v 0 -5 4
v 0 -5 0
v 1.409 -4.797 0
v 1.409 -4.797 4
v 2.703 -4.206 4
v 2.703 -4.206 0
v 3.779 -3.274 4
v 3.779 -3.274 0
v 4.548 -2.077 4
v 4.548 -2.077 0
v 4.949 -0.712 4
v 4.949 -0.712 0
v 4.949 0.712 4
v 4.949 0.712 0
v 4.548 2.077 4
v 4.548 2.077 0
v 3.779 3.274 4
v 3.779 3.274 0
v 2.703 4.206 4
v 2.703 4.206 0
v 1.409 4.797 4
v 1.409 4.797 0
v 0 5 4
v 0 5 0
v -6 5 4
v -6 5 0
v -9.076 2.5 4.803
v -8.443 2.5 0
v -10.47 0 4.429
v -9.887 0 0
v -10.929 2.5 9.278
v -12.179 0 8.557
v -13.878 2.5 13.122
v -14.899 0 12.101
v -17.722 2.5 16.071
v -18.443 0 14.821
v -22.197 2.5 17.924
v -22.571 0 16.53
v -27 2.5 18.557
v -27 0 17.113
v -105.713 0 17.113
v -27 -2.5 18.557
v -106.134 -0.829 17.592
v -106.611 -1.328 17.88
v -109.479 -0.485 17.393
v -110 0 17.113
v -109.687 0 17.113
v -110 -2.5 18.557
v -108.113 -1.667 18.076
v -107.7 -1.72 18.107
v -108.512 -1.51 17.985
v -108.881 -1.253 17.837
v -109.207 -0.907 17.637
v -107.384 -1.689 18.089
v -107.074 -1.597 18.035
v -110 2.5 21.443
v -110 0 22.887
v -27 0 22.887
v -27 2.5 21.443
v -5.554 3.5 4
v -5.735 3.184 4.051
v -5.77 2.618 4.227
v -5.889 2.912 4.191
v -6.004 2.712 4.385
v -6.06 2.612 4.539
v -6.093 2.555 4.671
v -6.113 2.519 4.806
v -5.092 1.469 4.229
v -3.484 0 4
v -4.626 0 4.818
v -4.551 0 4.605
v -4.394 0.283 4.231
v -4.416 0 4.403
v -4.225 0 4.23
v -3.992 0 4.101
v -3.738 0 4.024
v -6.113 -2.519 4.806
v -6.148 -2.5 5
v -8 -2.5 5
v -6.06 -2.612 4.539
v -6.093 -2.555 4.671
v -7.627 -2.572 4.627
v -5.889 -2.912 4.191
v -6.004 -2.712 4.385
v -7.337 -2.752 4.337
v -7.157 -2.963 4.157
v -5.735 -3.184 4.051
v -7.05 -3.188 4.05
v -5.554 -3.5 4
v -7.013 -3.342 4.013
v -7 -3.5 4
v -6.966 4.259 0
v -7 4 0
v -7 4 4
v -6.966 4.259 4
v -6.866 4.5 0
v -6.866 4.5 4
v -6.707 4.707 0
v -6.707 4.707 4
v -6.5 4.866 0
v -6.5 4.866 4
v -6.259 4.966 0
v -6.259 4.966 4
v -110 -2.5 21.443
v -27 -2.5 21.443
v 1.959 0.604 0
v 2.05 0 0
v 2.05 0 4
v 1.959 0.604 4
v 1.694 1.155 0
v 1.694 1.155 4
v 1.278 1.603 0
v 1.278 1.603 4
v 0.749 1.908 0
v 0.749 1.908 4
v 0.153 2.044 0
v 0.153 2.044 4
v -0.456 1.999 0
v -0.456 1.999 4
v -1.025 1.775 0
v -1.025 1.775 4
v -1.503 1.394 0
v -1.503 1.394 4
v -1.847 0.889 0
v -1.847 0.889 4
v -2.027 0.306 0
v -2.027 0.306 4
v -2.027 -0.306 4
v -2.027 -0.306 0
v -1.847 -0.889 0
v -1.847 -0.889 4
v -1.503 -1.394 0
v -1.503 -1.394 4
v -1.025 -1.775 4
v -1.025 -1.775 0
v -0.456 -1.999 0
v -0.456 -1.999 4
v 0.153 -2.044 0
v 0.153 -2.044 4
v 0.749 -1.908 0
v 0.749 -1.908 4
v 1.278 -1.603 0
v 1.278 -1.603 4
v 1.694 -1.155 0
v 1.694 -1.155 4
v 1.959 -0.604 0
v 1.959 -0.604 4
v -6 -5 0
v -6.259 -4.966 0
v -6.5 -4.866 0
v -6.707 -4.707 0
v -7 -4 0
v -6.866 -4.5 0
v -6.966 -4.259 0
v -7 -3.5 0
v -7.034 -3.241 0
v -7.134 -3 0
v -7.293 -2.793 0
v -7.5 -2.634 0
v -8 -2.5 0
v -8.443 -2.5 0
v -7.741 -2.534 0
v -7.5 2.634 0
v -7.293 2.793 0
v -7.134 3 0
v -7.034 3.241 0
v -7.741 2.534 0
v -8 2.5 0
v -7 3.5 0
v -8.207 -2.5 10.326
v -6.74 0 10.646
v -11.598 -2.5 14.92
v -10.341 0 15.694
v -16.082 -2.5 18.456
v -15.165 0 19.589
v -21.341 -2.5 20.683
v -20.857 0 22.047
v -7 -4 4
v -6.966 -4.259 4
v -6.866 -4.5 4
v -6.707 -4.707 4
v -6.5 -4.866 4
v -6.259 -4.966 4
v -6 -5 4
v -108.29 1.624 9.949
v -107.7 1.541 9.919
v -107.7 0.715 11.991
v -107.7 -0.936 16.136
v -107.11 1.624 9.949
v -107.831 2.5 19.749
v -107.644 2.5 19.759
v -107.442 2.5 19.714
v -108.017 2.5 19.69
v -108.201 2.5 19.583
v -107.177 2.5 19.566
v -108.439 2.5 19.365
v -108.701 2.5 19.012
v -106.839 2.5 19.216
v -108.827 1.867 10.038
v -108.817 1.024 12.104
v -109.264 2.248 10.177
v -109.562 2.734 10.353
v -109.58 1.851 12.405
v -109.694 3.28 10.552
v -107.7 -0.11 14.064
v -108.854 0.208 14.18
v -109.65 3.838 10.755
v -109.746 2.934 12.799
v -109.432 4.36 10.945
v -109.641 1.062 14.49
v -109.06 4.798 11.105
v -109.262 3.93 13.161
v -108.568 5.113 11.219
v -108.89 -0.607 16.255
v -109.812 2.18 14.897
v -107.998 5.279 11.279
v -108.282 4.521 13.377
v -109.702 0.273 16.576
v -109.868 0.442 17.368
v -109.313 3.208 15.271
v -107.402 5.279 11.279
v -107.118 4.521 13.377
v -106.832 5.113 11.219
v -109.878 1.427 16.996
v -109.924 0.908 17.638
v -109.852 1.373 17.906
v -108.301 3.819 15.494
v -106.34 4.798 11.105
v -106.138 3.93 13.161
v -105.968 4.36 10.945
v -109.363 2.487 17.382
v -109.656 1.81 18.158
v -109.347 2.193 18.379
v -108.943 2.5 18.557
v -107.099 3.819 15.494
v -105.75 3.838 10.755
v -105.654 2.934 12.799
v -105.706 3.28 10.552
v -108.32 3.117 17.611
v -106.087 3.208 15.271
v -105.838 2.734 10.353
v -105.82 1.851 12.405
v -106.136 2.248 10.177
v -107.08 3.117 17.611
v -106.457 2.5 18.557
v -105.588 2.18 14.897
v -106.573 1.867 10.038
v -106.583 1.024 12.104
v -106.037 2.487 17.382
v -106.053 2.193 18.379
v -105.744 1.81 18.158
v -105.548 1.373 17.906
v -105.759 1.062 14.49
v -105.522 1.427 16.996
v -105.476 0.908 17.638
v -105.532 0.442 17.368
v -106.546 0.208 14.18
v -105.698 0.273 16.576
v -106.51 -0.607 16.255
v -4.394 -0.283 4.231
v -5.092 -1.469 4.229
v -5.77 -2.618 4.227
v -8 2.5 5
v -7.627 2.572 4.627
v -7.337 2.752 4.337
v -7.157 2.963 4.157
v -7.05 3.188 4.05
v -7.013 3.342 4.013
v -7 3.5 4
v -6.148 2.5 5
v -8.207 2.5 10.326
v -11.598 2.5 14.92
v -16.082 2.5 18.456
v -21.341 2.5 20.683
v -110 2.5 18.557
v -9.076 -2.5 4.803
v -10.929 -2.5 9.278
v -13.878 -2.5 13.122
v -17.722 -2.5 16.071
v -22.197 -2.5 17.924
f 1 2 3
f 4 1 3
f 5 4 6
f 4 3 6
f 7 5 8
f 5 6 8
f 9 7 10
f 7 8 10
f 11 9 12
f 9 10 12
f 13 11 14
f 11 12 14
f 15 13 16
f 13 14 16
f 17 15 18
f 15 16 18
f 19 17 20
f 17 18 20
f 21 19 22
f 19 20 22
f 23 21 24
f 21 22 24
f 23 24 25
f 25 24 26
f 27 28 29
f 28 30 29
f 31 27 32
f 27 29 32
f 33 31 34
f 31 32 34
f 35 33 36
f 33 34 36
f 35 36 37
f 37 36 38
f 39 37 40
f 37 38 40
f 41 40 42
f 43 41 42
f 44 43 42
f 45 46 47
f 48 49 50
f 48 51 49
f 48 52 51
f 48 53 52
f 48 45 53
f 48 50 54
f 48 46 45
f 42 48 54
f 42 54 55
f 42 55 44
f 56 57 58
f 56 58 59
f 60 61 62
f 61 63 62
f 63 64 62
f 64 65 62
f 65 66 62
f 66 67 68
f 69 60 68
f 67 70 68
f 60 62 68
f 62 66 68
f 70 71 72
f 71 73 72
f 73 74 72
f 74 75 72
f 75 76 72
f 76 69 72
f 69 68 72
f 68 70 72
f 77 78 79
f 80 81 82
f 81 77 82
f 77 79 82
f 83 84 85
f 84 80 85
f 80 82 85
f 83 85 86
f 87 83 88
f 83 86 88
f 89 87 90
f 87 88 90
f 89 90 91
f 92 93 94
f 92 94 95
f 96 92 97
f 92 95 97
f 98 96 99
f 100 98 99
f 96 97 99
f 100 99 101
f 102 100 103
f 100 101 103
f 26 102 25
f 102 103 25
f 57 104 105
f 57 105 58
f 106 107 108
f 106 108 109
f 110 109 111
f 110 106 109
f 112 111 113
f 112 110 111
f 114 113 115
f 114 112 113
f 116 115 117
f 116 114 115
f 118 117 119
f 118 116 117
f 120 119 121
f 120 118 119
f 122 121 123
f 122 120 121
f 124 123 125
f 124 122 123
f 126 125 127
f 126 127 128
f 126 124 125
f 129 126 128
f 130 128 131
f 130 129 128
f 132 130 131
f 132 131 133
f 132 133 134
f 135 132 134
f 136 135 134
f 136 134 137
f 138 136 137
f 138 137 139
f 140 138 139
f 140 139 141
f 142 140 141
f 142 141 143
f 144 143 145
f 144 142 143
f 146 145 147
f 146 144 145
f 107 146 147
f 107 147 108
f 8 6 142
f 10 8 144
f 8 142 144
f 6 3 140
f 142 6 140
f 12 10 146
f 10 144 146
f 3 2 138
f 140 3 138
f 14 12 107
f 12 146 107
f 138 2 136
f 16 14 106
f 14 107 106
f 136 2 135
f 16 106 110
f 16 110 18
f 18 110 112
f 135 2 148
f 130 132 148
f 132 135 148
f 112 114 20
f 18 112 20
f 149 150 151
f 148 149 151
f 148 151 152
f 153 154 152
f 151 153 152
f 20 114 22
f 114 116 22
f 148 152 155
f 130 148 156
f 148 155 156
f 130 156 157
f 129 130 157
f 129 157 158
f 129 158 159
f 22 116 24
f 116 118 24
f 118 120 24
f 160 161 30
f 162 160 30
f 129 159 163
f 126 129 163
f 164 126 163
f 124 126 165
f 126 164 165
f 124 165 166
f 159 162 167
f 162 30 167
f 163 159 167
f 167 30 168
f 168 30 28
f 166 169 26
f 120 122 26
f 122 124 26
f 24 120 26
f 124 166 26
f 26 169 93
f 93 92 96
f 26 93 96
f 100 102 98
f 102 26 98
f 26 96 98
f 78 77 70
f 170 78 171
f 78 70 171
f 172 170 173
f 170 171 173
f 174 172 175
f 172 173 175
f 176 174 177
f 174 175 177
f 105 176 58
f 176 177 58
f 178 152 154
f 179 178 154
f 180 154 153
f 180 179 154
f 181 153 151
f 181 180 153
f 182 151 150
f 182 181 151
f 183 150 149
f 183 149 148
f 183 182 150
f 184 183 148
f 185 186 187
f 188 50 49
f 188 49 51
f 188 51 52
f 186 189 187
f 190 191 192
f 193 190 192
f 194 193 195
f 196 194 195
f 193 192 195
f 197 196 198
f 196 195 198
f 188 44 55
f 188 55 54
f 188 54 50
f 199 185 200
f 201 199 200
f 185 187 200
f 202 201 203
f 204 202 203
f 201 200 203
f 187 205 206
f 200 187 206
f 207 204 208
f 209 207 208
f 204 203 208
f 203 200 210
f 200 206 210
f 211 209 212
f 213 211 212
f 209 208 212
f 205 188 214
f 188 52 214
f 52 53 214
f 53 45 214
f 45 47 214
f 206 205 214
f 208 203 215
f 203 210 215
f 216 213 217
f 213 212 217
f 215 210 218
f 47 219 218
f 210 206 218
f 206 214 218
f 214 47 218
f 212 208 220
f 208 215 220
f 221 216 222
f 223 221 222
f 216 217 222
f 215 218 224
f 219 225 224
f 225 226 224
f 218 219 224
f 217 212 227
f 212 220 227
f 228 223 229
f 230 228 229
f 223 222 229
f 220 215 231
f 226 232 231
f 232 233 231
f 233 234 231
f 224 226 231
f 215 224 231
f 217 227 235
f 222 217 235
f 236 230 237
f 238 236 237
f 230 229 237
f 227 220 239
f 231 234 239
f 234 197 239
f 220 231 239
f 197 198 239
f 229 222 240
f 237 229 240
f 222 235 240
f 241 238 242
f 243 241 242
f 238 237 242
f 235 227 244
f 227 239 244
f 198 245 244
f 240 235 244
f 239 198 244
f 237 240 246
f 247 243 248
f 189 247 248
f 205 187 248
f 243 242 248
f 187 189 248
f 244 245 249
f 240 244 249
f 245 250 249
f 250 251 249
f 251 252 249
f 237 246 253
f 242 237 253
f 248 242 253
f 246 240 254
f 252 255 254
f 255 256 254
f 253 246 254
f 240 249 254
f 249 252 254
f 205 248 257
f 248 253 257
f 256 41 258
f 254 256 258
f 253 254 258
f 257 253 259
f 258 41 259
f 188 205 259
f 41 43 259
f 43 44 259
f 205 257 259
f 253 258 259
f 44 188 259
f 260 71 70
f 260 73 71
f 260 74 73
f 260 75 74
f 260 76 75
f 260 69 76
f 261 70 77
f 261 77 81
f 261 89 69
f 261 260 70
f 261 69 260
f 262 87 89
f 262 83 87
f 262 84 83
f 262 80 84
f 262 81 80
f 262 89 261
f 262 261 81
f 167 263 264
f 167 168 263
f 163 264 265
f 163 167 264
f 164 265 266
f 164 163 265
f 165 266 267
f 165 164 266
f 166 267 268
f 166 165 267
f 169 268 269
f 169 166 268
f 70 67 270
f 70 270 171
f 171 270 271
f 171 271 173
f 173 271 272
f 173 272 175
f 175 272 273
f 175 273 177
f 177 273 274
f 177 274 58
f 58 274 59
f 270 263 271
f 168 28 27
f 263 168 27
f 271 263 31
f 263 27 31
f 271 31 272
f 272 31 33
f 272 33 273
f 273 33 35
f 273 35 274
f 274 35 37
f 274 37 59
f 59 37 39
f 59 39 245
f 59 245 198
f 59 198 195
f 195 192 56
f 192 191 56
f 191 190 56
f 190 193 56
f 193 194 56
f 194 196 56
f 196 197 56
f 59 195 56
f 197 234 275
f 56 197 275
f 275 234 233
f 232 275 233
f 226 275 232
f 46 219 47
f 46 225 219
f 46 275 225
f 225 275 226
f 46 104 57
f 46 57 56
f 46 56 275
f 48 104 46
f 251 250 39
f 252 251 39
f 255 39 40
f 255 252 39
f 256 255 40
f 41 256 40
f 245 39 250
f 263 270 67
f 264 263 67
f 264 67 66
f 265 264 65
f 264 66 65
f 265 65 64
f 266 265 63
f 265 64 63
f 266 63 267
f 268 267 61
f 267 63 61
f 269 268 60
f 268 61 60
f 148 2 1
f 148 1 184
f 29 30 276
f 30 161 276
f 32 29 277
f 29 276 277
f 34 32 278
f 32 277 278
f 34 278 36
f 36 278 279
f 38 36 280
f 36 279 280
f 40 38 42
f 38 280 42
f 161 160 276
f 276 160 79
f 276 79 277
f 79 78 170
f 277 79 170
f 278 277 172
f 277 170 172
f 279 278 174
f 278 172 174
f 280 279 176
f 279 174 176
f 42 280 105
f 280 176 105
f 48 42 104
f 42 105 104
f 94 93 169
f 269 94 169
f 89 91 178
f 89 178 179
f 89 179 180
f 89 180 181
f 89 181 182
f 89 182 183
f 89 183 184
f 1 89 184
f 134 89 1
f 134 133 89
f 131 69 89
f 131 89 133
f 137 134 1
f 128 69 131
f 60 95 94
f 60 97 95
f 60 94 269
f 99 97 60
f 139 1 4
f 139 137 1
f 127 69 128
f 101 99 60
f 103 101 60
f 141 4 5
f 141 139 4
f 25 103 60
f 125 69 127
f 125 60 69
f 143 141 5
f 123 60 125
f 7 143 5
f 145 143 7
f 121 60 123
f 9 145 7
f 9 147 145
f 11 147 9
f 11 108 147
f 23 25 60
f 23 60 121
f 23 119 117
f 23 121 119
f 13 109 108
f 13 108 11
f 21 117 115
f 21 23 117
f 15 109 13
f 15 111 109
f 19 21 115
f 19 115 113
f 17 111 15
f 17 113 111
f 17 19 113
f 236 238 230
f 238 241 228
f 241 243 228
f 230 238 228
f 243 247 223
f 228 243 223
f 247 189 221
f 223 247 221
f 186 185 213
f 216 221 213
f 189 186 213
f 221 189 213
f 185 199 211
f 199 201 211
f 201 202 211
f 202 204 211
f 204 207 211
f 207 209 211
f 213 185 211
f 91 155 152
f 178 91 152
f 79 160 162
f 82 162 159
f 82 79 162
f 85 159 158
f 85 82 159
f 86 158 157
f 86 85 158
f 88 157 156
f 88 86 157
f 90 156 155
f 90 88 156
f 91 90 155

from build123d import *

# Parameters (mm, degrees)
SKETCH_R  = 2.05
PAD_DEPTH = 4
FILLET_R  = 1


with BuildPart() as part:
    # Sketch → Pad (new body)
    with BuildSketch(Plane.XY):
        with BuildLine():
            Line((0, 5), (-7, 5))
            Line((-7, 5), (-7, -5))
            Line((0, -5), (-7, -5))
            ThreePointArc((0, -5), (5, 0), (0, 5))
        make_face()
        Circle(SKETCH_R, mode=Mode.SUBTRACT)
    extrude(amount=PAD_DEPTH)

    # AdditivePipe: sweep along a path in Sketch001
    with BuildLine(Plane.XZ) as additivepipe_path:
        ThreePointArc((-7, 0), (-12.8578643763, 14.1421356237), (-27, 20))
        Line((-27, 20), (-110, 20))
    # Sketch002 → AdditivePipe (sweep)
    with BuildSketch(Plane.XY):
        Polygon((-8.443375673, -2.5), (-5.556624327, -2.5), (-4.1132486541, 0), (-5.556624327, 2.5), (-8.443375673, 2.5), (-9.8867513459, 0), align=None)
    sweep(path=additivepipe_path.line, is_frenet=True)

    # Sketch003 (on Face22 of AdditivePipe) → Revolution (revolve)
    with BuildSketch(Plane(origin=(-107.7, 0, 0), x_dir=(0, -1, 0), z_dir=(-1, 0, 0))):
        Polygon((0, 20), (-3.4202014333, 10.6030737921), (-1.5408161917, 9.9190335055), (2.1612930278, 19.2133536704), align=None)
    revolve(axis=Axis((-107.7, 6.4278760969, 2.3395555688), (0, 0.3420201433, -0.9396926208)))

    # Fillet
    fillet_edges = [part.edges().sort_by_distance(p)[0] for p in [
        (-6.466502, 2.5, 4),
        (-5.198955, 1.250176, 4),
        (-5.198955, -1.250176, 4),
        (-6.466502, -2.5, 4),
        (-7, -2.5, 2),
        (-7, -5, 2),
        (-7, 2.5, 2),
        (-7, 5, 2),
    ]]
    fillet(fillet_edges, radius=FILLET_R)


solid = part.part
